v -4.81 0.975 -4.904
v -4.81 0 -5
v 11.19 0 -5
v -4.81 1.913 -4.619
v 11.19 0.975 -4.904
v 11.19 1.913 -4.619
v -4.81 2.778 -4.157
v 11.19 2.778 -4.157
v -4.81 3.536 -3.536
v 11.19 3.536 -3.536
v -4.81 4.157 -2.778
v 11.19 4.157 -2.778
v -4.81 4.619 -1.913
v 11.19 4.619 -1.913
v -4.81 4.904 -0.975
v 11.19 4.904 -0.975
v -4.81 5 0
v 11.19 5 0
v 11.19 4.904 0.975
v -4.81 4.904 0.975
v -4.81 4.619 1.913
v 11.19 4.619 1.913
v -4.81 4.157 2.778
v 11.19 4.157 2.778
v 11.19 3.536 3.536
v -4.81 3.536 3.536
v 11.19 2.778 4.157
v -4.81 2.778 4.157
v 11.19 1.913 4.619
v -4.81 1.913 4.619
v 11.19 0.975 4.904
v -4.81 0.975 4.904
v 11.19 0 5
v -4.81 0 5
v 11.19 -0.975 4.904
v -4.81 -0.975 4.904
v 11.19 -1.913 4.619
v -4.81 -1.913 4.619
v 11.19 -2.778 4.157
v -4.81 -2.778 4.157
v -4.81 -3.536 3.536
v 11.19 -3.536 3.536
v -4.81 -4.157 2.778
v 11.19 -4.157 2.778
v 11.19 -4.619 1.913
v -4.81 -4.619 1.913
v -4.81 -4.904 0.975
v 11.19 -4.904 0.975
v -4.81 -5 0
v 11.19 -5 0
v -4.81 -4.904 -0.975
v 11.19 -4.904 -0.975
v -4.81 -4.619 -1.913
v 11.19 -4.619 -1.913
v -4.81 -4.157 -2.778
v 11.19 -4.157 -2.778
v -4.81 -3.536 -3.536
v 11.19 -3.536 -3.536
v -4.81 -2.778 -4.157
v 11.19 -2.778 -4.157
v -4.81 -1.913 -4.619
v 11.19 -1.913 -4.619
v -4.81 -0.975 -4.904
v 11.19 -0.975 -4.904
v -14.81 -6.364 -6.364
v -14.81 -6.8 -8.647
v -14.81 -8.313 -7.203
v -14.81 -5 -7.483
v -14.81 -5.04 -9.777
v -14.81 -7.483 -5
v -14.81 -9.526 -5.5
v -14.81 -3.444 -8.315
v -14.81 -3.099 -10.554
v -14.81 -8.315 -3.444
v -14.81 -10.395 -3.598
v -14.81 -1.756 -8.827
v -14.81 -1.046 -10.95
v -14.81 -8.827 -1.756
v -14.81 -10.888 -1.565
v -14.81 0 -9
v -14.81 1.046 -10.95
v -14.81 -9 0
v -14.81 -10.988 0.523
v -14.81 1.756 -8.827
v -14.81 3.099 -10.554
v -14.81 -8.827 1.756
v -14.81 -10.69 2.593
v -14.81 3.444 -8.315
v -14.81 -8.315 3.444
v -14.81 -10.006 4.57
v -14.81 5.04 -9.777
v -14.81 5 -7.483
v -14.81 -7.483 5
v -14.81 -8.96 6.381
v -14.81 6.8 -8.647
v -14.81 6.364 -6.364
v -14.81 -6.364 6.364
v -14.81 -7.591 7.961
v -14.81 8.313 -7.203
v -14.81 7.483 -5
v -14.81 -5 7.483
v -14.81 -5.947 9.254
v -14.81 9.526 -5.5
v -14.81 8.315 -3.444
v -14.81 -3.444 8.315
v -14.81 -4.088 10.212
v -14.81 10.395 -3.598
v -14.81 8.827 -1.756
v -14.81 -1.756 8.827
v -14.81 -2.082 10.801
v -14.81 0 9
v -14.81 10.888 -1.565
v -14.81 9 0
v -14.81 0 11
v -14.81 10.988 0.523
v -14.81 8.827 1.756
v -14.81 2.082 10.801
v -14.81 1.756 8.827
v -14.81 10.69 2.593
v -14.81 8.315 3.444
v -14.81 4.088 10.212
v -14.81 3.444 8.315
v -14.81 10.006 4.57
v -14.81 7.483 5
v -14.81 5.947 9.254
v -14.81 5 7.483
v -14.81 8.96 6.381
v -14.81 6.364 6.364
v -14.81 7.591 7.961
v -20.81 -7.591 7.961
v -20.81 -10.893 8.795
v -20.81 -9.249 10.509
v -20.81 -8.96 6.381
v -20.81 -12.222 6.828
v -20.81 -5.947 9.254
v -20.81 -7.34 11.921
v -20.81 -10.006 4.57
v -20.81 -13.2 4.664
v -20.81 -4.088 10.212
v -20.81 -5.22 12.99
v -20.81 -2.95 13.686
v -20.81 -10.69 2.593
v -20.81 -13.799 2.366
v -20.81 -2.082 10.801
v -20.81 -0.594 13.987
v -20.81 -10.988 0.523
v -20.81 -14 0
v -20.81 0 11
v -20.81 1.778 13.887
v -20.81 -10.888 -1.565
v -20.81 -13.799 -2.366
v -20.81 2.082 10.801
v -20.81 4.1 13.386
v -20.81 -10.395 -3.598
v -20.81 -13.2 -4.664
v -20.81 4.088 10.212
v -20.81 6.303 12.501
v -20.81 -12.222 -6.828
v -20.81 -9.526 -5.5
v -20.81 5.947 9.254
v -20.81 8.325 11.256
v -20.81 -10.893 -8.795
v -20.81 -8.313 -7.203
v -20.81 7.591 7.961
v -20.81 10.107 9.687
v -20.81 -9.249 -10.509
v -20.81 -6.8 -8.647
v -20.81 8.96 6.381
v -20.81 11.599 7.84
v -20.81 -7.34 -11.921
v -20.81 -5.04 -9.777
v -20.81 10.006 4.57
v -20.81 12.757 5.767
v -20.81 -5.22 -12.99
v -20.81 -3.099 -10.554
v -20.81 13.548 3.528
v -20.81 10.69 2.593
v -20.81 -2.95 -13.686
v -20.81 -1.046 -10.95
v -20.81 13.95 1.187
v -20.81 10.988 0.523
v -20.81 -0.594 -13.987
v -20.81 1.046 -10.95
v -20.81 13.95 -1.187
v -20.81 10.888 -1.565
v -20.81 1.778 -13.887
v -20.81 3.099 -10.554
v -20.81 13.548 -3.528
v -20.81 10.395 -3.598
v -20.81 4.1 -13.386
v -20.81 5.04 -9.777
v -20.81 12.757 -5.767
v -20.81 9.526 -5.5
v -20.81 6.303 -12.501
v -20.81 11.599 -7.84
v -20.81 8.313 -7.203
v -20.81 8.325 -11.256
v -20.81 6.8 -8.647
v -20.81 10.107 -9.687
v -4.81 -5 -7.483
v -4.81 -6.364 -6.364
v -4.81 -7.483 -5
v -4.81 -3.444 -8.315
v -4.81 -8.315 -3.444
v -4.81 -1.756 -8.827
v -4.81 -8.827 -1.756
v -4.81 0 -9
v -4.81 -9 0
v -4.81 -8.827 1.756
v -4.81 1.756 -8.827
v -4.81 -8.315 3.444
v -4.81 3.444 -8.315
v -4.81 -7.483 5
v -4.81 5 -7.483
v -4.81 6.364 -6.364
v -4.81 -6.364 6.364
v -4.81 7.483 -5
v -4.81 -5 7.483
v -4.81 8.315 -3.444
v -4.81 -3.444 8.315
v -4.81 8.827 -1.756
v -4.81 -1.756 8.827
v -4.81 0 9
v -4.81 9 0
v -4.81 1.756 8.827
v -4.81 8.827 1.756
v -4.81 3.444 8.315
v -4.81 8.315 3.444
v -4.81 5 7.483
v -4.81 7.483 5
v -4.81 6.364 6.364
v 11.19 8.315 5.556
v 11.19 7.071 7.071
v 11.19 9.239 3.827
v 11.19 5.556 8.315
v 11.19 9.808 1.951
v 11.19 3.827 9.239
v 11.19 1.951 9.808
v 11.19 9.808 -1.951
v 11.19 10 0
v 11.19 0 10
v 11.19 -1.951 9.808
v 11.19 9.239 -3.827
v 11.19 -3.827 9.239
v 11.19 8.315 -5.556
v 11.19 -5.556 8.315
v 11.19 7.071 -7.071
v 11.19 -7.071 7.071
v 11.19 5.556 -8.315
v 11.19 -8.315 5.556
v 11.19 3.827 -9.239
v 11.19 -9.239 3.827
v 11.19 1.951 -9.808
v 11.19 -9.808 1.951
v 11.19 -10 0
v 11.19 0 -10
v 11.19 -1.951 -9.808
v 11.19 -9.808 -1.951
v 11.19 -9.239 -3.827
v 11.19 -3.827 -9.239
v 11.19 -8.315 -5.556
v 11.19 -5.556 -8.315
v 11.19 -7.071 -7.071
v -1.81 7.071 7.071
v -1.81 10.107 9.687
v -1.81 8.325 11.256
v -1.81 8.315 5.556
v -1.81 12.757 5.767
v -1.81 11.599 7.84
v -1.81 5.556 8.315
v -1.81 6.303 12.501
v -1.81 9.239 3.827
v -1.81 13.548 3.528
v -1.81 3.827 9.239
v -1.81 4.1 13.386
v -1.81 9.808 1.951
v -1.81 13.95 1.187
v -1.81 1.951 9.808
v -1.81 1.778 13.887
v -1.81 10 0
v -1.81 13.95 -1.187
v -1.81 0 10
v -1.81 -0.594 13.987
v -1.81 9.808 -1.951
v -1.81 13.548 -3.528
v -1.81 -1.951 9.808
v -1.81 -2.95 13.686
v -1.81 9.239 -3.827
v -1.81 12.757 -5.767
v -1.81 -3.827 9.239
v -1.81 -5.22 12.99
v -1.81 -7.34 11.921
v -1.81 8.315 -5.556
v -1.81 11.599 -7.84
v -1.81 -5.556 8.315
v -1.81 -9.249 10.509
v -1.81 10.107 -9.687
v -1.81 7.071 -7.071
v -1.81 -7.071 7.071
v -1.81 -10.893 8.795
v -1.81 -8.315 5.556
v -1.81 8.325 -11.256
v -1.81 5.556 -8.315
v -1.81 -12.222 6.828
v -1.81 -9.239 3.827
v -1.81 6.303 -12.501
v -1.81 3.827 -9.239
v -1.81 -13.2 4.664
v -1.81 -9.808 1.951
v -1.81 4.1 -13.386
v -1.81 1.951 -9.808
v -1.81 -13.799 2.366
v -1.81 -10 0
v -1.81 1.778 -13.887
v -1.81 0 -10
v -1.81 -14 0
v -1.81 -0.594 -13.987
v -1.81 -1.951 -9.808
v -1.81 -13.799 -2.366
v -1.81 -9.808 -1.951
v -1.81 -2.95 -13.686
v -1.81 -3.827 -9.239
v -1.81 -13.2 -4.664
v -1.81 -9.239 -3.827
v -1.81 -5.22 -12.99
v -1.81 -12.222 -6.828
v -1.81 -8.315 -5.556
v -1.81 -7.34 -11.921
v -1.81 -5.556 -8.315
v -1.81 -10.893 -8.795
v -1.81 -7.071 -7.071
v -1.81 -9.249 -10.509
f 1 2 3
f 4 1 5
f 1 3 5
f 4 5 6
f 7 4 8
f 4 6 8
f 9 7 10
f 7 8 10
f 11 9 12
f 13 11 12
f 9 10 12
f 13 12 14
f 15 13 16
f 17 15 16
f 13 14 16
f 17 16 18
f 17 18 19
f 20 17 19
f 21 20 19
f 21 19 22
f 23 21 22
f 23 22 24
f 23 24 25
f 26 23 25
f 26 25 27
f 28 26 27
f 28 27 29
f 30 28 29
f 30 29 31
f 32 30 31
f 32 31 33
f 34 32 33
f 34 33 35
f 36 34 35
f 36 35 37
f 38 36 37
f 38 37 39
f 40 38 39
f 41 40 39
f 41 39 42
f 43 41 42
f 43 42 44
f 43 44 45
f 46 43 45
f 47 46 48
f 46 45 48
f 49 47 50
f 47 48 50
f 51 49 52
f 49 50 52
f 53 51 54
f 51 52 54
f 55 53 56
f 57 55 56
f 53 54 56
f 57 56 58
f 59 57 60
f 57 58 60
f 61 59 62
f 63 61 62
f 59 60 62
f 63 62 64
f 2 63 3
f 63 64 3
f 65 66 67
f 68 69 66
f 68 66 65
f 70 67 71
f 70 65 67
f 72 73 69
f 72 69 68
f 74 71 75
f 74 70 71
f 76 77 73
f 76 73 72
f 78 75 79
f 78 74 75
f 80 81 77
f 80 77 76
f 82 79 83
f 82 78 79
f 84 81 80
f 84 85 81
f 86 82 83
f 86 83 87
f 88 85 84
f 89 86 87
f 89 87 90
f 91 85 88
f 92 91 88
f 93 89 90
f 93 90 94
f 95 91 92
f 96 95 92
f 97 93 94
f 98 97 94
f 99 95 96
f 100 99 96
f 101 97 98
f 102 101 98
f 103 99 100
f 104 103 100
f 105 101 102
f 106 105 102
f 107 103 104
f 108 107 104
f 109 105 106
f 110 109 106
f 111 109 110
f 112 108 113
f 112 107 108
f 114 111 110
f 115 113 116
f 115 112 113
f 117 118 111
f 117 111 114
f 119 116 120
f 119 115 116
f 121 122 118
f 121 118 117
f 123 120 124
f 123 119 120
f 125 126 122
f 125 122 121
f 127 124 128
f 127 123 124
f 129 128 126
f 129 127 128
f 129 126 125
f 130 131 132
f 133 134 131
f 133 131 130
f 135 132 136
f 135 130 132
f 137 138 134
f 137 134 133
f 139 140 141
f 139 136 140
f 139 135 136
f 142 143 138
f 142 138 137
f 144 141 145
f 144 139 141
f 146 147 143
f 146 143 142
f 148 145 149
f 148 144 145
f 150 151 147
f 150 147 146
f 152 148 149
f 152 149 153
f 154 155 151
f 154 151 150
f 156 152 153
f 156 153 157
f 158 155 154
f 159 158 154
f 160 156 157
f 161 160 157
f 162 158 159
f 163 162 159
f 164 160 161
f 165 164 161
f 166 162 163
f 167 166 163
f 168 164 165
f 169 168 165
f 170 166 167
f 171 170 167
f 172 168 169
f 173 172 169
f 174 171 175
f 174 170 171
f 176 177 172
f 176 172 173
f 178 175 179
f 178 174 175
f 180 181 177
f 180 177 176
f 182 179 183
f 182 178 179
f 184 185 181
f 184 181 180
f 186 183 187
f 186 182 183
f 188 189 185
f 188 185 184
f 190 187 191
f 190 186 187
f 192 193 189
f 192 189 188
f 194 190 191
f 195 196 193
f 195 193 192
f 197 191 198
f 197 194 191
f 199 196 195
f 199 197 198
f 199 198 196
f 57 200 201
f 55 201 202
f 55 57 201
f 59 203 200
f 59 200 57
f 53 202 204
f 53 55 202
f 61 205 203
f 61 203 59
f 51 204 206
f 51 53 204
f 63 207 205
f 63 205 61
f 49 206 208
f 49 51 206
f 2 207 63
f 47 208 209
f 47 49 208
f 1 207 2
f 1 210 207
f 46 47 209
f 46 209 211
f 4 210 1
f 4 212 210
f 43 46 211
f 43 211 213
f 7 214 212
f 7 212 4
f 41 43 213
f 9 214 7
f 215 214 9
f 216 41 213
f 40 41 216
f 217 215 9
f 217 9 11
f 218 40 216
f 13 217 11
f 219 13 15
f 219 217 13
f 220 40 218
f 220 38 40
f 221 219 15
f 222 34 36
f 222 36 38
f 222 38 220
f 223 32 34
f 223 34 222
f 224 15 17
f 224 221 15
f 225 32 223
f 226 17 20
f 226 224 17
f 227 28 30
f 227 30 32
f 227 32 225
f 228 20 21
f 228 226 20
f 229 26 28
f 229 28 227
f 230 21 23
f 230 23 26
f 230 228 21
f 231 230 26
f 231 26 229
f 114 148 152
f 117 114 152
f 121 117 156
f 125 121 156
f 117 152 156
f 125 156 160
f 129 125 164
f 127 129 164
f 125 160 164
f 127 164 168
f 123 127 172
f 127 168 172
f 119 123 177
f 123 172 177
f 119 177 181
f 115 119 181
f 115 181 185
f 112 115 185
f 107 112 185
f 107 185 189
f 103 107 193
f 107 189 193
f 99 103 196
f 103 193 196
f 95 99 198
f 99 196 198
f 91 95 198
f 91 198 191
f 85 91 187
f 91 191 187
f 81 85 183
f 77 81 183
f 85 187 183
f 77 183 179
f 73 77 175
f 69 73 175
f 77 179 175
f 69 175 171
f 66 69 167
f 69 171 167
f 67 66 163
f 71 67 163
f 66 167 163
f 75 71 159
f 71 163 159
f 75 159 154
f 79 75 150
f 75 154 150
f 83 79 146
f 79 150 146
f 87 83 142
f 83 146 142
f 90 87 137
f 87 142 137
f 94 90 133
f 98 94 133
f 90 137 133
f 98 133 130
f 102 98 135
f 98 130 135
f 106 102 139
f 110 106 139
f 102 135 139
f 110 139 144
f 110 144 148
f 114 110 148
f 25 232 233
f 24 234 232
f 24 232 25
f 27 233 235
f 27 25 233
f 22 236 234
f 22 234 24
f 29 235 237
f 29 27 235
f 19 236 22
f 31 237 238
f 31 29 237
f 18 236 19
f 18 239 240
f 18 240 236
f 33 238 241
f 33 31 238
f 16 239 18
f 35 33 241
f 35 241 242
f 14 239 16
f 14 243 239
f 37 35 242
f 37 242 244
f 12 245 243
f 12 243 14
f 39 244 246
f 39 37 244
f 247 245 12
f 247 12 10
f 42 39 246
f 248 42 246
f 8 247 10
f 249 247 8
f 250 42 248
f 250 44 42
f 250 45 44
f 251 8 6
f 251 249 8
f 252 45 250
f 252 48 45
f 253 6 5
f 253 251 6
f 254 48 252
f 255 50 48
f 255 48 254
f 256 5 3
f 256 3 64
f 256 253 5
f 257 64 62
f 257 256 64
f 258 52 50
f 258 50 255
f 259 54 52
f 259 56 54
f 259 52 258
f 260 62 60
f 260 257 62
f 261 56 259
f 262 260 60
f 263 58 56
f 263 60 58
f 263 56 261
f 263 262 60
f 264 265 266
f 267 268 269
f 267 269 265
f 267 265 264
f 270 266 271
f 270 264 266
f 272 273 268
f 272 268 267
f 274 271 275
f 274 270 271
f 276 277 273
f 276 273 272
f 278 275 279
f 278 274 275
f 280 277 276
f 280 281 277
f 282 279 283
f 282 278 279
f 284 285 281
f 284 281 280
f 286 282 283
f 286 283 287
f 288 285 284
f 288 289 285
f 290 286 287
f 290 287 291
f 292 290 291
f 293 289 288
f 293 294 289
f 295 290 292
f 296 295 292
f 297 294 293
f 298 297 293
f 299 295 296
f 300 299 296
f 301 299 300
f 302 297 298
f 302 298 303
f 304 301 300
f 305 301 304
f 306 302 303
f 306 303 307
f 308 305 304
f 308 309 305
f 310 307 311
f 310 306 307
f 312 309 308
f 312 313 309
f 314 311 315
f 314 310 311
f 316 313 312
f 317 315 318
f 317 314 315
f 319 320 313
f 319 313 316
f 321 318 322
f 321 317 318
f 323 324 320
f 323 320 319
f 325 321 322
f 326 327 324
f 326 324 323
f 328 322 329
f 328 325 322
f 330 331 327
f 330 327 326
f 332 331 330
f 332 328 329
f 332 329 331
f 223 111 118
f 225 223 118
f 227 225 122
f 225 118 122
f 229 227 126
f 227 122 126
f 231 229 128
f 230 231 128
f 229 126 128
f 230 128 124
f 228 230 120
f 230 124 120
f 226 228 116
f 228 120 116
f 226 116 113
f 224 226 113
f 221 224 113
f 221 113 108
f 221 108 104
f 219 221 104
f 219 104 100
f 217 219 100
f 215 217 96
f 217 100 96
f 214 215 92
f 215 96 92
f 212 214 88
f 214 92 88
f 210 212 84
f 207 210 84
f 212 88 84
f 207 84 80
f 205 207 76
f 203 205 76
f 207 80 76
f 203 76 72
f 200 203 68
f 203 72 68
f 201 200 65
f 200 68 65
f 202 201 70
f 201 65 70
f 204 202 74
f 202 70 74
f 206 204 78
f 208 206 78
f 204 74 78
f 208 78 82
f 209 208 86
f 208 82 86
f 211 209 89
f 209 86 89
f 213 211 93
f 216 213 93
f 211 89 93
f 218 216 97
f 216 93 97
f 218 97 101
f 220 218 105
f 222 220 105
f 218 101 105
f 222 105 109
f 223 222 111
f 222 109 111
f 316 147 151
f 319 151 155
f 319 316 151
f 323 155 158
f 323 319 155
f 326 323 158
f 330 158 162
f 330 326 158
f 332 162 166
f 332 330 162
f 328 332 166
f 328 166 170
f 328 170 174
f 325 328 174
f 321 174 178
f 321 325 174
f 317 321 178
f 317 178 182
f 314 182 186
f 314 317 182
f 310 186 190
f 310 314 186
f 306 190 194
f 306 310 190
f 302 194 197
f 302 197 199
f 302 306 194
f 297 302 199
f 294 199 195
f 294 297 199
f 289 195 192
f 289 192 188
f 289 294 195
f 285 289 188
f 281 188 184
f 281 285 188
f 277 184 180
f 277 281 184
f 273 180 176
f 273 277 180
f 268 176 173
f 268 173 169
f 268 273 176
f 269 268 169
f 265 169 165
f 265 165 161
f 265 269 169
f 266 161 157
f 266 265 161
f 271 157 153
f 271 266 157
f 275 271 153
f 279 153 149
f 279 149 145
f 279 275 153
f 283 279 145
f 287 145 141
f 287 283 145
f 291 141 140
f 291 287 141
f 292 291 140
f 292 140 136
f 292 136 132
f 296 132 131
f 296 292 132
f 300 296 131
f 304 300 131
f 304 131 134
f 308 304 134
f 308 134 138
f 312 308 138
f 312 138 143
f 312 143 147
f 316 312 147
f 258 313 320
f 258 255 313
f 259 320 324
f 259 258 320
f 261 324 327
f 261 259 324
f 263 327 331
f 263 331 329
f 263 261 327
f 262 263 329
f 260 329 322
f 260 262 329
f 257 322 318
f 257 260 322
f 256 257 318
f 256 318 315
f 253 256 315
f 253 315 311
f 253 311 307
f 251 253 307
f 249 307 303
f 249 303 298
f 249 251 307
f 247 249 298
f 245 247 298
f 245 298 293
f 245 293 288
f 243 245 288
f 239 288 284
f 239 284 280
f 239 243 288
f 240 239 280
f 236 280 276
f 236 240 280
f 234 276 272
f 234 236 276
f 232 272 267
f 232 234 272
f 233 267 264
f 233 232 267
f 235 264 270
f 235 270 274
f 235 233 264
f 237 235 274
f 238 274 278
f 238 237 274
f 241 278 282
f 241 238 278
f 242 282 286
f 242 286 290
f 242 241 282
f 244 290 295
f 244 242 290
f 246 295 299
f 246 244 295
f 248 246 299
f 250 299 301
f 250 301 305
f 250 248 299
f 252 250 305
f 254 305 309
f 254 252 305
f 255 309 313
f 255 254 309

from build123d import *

# Parameters (mm, degrees)
SKETCH2_R               = 11
CUT_EXTRUDE2_DEPTH      = 6
SKETCH6_R               = 9
CUT_EXTRUDE3_DEPTH      = 10
SKETCH7_R               = 5
CUT_EXTRUDE4_DEPTH      = 1
CUT_EXTRUDE4_DEPTH_BACK = 33


with BuildPart() as part:
    # Sketch1 → Revolve1 (revolve)
    with BuildSketch(Plane.XY):
        Polygon((-20.809912875, 0), (-20.809912875, -14), (-1.809912875, -14), (-1.809912875, -10), (11.190087125, -10), (11.190087125, 0), align=None)
    revolve(axis=Axis((-20.809912875, 0, 0), (1, 0, 0)))

    # Sketch2 → Cut-Extrude2 (cut)
    with BuildSketch(Plane.ZY.offset(20.809912875)):
        Circle(SKETCH2_R)
    extrude(amount=-CUT_EXTRUDE2_DEPTH, mode=Mode.SUBTRACT)

    # Sketch6 → Cut-Extrude3 (cut)
    with BuildSketch(Plane.ZY.offset(14.809912875)):
        Circle(SKETCH6_R)
    extrude(amount=-CUT_EXTRUDE3_DEPTH, mode=Mode.SUBTRACT)

    # Sketch7 → Cut-Extrude4 (cut, two sides)
    with BuildSketch(Plane(origin=(11.190087125, 0, 0), x_dir=(0, 0, -1), z_dir=(1, 0, 0))) as cut_extrude4_sk:
        Circle(SKETCH7_R)
    extrude(amount=CUT_EXTRUDE4_DEPTH, mode=Mode.SUBTRACT)
    extrude(cut_extrude4_sk.sketch, amount=-CUT_EXTRUDE4_DEPTH_BACK, mode=Mode.SUBTRACT)


solid = part.part
